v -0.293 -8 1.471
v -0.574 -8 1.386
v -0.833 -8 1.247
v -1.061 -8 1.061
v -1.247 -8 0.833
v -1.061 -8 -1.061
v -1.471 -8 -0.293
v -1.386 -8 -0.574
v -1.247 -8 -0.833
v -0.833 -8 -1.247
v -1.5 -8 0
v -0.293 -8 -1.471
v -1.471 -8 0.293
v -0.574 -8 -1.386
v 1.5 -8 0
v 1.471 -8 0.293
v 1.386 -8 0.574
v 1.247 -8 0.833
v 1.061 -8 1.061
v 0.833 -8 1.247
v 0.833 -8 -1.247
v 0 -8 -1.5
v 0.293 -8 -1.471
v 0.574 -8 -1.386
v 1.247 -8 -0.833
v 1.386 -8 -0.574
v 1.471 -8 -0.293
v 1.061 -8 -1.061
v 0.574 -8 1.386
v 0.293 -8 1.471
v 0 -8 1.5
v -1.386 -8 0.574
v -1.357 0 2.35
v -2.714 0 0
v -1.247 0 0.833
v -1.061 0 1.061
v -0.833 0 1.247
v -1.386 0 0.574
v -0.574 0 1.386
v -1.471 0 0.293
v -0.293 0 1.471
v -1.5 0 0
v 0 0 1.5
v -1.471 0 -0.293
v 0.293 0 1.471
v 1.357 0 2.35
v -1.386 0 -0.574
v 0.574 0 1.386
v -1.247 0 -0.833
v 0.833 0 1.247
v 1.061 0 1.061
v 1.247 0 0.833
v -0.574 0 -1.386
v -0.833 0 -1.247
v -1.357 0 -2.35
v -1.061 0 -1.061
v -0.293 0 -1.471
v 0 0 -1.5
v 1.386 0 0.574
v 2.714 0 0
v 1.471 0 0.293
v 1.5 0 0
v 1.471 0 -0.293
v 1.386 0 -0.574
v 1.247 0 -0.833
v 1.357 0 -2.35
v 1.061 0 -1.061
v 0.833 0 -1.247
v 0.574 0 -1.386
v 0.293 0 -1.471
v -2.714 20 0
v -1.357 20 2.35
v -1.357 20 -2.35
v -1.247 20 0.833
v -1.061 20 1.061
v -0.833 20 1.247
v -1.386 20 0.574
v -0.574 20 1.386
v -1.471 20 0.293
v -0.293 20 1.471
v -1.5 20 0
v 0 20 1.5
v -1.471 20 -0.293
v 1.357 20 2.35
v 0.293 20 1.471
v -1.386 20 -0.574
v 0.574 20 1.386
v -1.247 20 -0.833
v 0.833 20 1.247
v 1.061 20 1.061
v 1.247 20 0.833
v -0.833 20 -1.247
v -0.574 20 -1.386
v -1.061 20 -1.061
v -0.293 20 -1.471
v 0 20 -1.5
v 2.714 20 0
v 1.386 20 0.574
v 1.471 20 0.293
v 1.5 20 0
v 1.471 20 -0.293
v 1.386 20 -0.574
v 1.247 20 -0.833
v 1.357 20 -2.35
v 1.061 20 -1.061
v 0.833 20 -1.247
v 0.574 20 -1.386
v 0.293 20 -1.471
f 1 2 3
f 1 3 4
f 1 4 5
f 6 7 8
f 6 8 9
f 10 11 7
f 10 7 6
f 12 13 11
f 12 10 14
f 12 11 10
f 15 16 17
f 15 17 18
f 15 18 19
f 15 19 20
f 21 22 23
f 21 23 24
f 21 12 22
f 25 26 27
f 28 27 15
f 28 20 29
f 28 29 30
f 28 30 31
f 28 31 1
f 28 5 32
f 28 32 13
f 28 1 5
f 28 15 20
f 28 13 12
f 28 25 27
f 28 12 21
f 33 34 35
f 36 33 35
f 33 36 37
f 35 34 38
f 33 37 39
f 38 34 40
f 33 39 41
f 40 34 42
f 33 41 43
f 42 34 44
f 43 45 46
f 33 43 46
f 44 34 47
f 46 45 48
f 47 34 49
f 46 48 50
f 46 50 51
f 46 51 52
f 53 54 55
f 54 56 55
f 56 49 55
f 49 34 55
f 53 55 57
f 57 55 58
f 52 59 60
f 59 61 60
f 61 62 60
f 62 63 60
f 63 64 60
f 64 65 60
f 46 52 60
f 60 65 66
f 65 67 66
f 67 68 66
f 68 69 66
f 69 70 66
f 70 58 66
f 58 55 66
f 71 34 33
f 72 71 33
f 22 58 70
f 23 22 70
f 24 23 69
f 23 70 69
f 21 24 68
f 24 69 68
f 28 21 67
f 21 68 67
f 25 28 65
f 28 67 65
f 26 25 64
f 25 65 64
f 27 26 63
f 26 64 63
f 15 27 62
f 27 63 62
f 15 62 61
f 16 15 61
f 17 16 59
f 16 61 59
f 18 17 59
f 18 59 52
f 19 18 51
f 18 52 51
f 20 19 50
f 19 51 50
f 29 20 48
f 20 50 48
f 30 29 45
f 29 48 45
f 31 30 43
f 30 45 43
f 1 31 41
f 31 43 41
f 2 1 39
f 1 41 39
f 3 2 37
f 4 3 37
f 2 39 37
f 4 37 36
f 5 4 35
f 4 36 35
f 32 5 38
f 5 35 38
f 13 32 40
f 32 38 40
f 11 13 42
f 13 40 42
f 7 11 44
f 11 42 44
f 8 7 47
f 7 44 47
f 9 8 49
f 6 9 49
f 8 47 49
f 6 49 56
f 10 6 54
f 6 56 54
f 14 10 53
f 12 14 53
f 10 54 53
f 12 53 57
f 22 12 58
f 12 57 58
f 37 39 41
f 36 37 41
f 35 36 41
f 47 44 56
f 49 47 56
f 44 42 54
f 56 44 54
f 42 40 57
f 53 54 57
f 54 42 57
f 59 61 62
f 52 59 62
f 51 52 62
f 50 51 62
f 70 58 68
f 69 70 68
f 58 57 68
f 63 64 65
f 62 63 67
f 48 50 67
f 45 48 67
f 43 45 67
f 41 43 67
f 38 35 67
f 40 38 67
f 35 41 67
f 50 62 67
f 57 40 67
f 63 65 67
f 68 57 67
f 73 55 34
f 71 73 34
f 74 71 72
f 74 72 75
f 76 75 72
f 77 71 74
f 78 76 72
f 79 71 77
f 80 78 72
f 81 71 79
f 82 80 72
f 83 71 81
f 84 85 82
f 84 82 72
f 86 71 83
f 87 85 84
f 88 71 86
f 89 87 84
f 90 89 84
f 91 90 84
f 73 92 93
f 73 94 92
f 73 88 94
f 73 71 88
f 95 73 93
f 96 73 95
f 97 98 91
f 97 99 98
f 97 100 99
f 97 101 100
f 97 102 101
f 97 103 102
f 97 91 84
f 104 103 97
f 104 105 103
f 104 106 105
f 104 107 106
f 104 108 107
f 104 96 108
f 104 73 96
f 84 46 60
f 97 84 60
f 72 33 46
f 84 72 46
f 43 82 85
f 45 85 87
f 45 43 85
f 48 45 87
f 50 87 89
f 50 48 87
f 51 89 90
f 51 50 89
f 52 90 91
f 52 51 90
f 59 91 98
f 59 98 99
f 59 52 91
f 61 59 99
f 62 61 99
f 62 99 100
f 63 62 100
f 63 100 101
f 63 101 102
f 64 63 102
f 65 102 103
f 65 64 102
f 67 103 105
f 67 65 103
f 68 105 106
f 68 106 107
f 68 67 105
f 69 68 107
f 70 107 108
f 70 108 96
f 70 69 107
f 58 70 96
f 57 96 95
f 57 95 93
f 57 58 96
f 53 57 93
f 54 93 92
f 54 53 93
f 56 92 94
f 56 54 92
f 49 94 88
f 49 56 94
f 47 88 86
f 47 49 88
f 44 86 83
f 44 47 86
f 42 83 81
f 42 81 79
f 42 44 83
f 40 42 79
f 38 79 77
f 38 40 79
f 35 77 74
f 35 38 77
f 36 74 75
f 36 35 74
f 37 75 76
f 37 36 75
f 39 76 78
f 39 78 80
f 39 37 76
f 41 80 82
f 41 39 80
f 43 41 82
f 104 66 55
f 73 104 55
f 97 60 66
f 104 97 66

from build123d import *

# Parameters (mm, degrees)
SKETCH_1_R      = 1.5
EXTRUDE_1_DEPTH = 20
SKETCH_2_R      = 1.5
EXTRUDE_2_DEPTH = 8


with BuildPart() as part:
    # 草图1 → 凸台-拉伸1 (new body)
    with BuildSketch(Plane(origin=(0, 0, 0), x_dir=(1, 0, 0), z_dir=(0, 1, 0))):
        Polygon((2.713546265, 0), (1.356773133, 2.35), (-1.356773133, 2.35), (-2.713546265, 0), (-1.356773133, -2.35), (1.356773133, -2.35), align=None)
        with Locations(Location((0, 0, 0), (0, 0, 270))):
            Circle(SKETCH_1_R, mode=Mode.SUBTRACT)
    extrude(amount=EXTRUDE_1_DEPTH)


with BuildPart() as body_2:
    # 草图2 → 凸台-拉伸2 (new body)
    with BuildSketch(Plane(origin=(0, 0, 0), x_dir=(-1, 0, 0), z_dir=(0, -1, 0))):
        with Locations(Location((0, 0, 0), (0, 0, 90))):
            Circle(SKETCH_2_R)
    extrude(amount=EXTRUDE_2_DEPTH)


solid = Compound([part.part, body_2.part])
